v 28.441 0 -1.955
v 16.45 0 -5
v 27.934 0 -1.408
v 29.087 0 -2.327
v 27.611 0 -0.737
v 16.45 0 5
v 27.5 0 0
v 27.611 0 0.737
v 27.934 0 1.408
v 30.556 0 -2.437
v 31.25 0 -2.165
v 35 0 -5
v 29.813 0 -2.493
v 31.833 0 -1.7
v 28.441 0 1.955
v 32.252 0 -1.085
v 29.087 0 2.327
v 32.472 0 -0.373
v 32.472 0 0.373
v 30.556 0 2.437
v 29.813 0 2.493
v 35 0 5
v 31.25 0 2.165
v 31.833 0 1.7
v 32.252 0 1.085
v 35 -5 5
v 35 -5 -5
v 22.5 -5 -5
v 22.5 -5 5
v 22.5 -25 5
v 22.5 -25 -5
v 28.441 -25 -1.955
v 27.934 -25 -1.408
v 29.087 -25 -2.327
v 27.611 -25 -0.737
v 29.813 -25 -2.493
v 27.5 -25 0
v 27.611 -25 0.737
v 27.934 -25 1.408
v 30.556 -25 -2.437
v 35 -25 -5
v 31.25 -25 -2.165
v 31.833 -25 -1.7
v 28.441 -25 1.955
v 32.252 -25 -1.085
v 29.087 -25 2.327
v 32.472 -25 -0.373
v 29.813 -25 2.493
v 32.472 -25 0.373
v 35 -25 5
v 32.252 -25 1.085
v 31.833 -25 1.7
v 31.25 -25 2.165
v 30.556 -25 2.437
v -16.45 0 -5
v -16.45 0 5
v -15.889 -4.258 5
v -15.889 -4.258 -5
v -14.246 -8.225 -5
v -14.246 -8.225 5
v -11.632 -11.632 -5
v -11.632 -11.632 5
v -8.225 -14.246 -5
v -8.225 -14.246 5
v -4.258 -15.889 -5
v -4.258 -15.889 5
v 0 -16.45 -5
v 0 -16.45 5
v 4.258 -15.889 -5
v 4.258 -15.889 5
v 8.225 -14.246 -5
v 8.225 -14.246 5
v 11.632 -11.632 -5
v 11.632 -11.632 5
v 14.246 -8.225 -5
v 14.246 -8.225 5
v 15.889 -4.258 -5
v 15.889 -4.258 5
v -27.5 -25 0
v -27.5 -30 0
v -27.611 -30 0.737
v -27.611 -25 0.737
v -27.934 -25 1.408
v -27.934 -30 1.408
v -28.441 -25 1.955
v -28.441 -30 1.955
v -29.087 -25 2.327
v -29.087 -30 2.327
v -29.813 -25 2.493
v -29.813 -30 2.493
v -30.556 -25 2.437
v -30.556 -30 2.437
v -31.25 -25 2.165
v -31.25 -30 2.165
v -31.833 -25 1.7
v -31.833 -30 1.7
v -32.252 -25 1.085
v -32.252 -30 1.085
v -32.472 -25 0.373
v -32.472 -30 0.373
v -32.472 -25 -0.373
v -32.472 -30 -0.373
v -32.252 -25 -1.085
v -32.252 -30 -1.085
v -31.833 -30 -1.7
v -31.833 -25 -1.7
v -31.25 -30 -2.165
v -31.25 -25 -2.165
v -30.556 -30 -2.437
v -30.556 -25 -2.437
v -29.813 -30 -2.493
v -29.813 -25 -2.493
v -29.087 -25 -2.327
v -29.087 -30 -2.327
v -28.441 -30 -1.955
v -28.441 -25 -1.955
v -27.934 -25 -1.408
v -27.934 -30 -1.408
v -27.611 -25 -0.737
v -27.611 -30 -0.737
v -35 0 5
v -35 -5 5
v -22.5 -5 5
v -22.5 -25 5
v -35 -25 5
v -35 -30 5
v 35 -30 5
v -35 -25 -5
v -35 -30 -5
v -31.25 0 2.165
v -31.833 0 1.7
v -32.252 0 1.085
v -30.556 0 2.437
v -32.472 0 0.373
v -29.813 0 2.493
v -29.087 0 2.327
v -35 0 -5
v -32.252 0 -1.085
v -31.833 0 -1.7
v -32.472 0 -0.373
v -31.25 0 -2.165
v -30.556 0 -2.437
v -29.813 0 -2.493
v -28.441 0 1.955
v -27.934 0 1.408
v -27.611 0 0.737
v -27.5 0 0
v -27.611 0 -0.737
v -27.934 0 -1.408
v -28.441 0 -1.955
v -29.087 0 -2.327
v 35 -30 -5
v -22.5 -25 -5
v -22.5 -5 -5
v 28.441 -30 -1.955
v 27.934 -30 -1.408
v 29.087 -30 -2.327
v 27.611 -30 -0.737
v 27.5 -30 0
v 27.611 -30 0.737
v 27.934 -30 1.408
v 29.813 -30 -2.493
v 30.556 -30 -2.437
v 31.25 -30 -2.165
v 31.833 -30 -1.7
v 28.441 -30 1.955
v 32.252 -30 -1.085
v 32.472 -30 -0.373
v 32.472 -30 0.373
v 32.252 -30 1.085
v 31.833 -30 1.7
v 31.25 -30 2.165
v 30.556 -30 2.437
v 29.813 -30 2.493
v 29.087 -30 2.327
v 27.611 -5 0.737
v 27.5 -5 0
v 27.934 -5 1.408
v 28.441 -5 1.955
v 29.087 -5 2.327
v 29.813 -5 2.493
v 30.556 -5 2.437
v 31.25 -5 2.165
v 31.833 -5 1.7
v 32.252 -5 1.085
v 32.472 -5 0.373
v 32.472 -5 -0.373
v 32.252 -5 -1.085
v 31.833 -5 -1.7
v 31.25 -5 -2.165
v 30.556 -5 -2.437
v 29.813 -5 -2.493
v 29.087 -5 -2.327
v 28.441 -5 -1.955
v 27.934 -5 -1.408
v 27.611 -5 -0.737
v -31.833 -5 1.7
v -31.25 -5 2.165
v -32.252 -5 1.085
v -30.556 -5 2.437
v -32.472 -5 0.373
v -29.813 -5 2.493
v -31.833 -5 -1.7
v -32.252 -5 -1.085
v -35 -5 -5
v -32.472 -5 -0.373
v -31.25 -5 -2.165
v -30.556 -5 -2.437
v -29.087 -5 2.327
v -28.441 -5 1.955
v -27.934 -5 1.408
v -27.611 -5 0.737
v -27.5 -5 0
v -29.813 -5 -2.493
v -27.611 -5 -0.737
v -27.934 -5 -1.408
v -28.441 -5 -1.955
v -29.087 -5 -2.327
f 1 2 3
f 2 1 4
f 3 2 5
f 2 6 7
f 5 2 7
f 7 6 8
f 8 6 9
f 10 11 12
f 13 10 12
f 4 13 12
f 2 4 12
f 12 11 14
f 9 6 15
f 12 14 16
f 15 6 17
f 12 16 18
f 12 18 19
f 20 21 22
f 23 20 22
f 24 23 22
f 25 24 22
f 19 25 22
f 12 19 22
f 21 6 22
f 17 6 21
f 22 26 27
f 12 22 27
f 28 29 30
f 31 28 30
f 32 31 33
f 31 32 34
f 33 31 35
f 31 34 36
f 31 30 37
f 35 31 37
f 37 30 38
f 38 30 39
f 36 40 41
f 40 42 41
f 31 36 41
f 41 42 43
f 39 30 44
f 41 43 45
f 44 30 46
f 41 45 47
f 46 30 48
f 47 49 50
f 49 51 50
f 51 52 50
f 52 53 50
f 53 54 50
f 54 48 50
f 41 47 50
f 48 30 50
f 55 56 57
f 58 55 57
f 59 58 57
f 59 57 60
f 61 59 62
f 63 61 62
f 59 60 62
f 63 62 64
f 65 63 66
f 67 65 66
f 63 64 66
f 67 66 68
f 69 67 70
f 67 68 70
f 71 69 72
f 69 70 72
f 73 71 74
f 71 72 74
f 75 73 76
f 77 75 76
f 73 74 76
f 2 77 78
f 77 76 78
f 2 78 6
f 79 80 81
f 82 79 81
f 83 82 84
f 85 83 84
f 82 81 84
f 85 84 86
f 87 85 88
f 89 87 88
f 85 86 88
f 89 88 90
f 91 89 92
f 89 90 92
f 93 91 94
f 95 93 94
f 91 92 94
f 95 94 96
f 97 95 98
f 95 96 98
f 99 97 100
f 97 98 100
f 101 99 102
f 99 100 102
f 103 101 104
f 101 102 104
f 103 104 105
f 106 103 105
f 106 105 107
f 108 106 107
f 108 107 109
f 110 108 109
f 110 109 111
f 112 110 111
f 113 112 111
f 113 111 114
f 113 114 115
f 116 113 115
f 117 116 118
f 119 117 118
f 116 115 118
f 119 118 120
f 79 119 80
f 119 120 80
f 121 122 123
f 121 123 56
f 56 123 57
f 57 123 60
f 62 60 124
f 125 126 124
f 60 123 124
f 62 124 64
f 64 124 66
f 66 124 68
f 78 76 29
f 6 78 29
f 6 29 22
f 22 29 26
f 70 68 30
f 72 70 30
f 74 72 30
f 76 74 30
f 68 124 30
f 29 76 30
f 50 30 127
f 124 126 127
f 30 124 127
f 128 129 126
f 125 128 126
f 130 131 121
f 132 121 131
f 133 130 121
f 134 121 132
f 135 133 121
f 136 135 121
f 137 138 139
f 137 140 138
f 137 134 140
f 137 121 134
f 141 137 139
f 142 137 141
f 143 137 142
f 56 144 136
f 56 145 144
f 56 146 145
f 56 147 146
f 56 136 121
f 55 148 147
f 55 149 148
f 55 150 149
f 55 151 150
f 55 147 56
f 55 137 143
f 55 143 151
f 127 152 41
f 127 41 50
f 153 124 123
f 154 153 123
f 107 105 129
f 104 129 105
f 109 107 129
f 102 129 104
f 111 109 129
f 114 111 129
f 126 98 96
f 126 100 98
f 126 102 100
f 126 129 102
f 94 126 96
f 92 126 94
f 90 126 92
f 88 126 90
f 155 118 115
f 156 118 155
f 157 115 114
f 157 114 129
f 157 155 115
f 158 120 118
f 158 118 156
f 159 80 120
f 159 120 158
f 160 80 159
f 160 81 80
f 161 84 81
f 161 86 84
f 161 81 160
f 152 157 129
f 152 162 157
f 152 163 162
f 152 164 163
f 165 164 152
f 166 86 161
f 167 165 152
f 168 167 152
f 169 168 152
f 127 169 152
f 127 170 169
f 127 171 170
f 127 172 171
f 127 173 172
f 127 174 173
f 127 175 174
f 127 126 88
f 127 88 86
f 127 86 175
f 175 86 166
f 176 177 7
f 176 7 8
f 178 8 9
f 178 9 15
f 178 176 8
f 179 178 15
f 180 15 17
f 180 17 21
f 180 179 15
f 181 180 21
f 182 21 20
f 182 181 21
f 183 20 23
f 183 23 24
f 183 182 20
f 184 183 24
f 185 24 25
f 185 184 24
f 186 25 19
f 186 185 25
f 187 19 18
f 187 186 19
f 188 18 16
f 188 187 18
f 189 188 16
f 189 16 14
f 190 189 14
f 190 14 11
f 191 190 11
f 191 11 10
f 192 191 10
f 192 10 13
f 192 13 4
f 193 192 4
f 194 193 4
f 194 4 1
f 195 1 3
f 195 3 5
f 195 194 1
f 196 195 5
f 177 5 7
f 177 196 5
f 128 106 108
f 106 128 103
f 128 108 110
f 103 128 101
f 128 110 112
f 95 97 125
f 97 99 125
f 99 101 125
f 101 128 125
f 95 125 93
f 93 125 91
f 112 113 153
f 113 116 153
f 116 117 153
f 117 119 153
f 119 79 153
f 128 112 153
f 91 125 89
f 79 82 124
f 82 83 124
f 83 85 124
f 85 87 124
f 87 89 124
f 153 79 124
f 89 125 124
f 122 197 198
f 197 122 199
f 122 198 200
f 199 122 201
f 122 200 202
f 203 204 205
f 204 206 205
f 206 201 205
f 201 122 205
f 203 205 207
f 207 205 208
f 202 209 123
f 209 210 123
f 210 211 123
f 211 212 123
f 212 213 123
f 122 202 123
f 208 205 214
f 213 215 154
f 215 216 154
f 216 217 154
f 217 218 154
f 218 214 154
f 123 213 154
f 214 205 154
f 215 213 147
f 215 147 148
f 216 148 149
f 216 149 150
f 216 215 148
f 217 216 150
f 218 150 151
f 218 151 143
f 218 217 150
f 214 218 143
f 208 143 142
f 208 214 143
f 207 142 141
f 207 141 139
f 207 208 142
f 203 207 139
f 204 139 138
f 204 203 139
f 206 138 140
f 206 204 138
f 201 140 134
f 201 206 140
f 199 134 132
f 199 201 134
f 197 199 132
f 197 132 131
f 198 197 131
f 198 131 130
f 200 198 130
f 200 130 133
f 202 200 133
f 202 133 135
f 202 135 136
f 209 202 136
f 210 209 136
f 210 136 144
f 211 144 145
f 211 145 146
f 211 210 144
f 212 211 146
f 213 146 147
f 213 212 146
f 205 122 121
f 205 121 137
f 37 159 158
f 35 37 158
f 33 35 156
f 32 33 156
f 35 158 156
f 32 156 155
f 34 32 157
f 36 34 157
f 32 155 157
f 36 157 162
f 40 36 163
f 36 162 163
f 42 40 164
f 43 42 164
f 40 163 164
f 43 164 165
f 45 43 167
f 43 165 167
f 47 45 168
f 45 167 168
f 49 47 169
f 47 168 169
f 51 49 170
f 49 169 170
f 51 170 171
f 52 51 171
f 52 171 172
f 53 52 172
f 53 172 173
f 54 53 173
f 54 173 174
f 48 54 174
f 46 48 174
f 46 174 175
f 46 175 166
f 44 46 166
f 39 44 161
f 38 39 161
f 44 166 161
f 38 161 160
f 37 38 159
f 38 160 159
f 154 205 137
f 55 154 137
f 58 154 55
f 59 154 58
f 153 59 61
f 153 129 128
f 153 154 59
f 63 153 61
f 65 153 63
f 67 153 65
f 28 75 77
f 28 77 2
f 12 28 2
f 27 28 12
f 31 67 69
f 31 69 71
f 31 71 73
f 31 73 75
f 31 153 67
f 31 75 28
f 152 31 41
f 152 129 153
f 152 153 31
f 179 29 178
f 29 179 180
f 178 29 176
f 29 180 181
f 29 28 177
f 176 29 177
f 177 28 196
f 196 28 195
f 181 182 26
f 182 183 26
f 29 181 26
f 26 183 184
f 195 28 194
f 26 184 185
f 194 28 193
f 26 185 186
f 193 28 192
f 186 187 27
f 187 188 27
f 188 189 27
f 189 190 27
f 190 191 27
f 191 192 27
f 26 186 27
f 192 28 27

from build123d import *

# Parameters (mm, degrees)
EXTRUDE_1_DEPTH = 5
SKETCH_3_W      = 70
SKETCH_3_H      = 10
SKETCH_3_R      = 2.5
EXTRUDE_2_DEPTH = 5
EXTRUDE_START   = -5
SKETCH_4_W      = 12.5
SKETCH_4_H      = 10
SKETCH_4_R      = 2.5
EXTRUDE_3_DEPTH = 5


with BuildPart() as part:
    # 草图1 → 凸台-拉伸1 (new, symmetric)
    with BuildSketch(Plane.XY):
        with BuildLine():
            Line((16.45, 0), (22.5, 0))
            Line((22.5, 0), (22.5, -30))
            Line((22.5, -30), (-22.5, -30))
            Line((-22.5, -30), (-22.5, 0))
            Line((-22.5, 0), (-16.45, 0))
            ThreePointArc((-16.45, 0), (0, -16.45), (16.45, 0))
        make_face()
    extrude(amount=EXTRUDE_1_DEPTH, both=True)

    # 草图3 → 凸台-拉伸2 (add)
    with BuildSketch(Plane.XZ.offset(30)):
        Rectangle(SKETCH_3_W, SKETCH_3_H)
        with Locations((-30, 0)):
            Circle(SKETCH_3_R, mode=Mode.SUBTRACT)
        with Locations(Location((30, 0, 0), (0, 0, 180))):
            Circle(SKETCH_3_R, mode=Mode.SUBTRACT)
    extrude(amount=-EXTRUDE_2_DEPTH)

    # 草图4 → 凸台-拉伸3 (add)
    # profile 1 of 2: a face of its own
    with BuildSketch(Plane(origin=(0, 0, 0), x_dir=(1, 0, 0), z_dir=(0, 1, 0)).offset(EXTRUDE_START)):
        with Locations((-28.75, 0)):
            Rectangle(SKETCH_4_W, SKETCH_4_H)
        with Locations((-30, 0)):
            Circle(SKETCH_4_R, mode=Mode.SUBTRACT)
    # profile 2 of 2: a face of its own
    with BuildSketch(Plane(origin=(0, 0, 0), x_dir=(1, 0, 0), z_dir=(0, 1, 0)).offset(EXTRUDE_START)):
        with Locations((28.75, 0)):
            Rectangle(SKETCH_4_W, SKETCH_4_H)
        with Locations(Location((30, 0, 0), (0, 0, 180))):
            Circle(SKETCH_4_R, mode=Mode.SUBTRACT)
    extrude(amount=EXTRUDE_3_DEPTH)


solid = part.part
